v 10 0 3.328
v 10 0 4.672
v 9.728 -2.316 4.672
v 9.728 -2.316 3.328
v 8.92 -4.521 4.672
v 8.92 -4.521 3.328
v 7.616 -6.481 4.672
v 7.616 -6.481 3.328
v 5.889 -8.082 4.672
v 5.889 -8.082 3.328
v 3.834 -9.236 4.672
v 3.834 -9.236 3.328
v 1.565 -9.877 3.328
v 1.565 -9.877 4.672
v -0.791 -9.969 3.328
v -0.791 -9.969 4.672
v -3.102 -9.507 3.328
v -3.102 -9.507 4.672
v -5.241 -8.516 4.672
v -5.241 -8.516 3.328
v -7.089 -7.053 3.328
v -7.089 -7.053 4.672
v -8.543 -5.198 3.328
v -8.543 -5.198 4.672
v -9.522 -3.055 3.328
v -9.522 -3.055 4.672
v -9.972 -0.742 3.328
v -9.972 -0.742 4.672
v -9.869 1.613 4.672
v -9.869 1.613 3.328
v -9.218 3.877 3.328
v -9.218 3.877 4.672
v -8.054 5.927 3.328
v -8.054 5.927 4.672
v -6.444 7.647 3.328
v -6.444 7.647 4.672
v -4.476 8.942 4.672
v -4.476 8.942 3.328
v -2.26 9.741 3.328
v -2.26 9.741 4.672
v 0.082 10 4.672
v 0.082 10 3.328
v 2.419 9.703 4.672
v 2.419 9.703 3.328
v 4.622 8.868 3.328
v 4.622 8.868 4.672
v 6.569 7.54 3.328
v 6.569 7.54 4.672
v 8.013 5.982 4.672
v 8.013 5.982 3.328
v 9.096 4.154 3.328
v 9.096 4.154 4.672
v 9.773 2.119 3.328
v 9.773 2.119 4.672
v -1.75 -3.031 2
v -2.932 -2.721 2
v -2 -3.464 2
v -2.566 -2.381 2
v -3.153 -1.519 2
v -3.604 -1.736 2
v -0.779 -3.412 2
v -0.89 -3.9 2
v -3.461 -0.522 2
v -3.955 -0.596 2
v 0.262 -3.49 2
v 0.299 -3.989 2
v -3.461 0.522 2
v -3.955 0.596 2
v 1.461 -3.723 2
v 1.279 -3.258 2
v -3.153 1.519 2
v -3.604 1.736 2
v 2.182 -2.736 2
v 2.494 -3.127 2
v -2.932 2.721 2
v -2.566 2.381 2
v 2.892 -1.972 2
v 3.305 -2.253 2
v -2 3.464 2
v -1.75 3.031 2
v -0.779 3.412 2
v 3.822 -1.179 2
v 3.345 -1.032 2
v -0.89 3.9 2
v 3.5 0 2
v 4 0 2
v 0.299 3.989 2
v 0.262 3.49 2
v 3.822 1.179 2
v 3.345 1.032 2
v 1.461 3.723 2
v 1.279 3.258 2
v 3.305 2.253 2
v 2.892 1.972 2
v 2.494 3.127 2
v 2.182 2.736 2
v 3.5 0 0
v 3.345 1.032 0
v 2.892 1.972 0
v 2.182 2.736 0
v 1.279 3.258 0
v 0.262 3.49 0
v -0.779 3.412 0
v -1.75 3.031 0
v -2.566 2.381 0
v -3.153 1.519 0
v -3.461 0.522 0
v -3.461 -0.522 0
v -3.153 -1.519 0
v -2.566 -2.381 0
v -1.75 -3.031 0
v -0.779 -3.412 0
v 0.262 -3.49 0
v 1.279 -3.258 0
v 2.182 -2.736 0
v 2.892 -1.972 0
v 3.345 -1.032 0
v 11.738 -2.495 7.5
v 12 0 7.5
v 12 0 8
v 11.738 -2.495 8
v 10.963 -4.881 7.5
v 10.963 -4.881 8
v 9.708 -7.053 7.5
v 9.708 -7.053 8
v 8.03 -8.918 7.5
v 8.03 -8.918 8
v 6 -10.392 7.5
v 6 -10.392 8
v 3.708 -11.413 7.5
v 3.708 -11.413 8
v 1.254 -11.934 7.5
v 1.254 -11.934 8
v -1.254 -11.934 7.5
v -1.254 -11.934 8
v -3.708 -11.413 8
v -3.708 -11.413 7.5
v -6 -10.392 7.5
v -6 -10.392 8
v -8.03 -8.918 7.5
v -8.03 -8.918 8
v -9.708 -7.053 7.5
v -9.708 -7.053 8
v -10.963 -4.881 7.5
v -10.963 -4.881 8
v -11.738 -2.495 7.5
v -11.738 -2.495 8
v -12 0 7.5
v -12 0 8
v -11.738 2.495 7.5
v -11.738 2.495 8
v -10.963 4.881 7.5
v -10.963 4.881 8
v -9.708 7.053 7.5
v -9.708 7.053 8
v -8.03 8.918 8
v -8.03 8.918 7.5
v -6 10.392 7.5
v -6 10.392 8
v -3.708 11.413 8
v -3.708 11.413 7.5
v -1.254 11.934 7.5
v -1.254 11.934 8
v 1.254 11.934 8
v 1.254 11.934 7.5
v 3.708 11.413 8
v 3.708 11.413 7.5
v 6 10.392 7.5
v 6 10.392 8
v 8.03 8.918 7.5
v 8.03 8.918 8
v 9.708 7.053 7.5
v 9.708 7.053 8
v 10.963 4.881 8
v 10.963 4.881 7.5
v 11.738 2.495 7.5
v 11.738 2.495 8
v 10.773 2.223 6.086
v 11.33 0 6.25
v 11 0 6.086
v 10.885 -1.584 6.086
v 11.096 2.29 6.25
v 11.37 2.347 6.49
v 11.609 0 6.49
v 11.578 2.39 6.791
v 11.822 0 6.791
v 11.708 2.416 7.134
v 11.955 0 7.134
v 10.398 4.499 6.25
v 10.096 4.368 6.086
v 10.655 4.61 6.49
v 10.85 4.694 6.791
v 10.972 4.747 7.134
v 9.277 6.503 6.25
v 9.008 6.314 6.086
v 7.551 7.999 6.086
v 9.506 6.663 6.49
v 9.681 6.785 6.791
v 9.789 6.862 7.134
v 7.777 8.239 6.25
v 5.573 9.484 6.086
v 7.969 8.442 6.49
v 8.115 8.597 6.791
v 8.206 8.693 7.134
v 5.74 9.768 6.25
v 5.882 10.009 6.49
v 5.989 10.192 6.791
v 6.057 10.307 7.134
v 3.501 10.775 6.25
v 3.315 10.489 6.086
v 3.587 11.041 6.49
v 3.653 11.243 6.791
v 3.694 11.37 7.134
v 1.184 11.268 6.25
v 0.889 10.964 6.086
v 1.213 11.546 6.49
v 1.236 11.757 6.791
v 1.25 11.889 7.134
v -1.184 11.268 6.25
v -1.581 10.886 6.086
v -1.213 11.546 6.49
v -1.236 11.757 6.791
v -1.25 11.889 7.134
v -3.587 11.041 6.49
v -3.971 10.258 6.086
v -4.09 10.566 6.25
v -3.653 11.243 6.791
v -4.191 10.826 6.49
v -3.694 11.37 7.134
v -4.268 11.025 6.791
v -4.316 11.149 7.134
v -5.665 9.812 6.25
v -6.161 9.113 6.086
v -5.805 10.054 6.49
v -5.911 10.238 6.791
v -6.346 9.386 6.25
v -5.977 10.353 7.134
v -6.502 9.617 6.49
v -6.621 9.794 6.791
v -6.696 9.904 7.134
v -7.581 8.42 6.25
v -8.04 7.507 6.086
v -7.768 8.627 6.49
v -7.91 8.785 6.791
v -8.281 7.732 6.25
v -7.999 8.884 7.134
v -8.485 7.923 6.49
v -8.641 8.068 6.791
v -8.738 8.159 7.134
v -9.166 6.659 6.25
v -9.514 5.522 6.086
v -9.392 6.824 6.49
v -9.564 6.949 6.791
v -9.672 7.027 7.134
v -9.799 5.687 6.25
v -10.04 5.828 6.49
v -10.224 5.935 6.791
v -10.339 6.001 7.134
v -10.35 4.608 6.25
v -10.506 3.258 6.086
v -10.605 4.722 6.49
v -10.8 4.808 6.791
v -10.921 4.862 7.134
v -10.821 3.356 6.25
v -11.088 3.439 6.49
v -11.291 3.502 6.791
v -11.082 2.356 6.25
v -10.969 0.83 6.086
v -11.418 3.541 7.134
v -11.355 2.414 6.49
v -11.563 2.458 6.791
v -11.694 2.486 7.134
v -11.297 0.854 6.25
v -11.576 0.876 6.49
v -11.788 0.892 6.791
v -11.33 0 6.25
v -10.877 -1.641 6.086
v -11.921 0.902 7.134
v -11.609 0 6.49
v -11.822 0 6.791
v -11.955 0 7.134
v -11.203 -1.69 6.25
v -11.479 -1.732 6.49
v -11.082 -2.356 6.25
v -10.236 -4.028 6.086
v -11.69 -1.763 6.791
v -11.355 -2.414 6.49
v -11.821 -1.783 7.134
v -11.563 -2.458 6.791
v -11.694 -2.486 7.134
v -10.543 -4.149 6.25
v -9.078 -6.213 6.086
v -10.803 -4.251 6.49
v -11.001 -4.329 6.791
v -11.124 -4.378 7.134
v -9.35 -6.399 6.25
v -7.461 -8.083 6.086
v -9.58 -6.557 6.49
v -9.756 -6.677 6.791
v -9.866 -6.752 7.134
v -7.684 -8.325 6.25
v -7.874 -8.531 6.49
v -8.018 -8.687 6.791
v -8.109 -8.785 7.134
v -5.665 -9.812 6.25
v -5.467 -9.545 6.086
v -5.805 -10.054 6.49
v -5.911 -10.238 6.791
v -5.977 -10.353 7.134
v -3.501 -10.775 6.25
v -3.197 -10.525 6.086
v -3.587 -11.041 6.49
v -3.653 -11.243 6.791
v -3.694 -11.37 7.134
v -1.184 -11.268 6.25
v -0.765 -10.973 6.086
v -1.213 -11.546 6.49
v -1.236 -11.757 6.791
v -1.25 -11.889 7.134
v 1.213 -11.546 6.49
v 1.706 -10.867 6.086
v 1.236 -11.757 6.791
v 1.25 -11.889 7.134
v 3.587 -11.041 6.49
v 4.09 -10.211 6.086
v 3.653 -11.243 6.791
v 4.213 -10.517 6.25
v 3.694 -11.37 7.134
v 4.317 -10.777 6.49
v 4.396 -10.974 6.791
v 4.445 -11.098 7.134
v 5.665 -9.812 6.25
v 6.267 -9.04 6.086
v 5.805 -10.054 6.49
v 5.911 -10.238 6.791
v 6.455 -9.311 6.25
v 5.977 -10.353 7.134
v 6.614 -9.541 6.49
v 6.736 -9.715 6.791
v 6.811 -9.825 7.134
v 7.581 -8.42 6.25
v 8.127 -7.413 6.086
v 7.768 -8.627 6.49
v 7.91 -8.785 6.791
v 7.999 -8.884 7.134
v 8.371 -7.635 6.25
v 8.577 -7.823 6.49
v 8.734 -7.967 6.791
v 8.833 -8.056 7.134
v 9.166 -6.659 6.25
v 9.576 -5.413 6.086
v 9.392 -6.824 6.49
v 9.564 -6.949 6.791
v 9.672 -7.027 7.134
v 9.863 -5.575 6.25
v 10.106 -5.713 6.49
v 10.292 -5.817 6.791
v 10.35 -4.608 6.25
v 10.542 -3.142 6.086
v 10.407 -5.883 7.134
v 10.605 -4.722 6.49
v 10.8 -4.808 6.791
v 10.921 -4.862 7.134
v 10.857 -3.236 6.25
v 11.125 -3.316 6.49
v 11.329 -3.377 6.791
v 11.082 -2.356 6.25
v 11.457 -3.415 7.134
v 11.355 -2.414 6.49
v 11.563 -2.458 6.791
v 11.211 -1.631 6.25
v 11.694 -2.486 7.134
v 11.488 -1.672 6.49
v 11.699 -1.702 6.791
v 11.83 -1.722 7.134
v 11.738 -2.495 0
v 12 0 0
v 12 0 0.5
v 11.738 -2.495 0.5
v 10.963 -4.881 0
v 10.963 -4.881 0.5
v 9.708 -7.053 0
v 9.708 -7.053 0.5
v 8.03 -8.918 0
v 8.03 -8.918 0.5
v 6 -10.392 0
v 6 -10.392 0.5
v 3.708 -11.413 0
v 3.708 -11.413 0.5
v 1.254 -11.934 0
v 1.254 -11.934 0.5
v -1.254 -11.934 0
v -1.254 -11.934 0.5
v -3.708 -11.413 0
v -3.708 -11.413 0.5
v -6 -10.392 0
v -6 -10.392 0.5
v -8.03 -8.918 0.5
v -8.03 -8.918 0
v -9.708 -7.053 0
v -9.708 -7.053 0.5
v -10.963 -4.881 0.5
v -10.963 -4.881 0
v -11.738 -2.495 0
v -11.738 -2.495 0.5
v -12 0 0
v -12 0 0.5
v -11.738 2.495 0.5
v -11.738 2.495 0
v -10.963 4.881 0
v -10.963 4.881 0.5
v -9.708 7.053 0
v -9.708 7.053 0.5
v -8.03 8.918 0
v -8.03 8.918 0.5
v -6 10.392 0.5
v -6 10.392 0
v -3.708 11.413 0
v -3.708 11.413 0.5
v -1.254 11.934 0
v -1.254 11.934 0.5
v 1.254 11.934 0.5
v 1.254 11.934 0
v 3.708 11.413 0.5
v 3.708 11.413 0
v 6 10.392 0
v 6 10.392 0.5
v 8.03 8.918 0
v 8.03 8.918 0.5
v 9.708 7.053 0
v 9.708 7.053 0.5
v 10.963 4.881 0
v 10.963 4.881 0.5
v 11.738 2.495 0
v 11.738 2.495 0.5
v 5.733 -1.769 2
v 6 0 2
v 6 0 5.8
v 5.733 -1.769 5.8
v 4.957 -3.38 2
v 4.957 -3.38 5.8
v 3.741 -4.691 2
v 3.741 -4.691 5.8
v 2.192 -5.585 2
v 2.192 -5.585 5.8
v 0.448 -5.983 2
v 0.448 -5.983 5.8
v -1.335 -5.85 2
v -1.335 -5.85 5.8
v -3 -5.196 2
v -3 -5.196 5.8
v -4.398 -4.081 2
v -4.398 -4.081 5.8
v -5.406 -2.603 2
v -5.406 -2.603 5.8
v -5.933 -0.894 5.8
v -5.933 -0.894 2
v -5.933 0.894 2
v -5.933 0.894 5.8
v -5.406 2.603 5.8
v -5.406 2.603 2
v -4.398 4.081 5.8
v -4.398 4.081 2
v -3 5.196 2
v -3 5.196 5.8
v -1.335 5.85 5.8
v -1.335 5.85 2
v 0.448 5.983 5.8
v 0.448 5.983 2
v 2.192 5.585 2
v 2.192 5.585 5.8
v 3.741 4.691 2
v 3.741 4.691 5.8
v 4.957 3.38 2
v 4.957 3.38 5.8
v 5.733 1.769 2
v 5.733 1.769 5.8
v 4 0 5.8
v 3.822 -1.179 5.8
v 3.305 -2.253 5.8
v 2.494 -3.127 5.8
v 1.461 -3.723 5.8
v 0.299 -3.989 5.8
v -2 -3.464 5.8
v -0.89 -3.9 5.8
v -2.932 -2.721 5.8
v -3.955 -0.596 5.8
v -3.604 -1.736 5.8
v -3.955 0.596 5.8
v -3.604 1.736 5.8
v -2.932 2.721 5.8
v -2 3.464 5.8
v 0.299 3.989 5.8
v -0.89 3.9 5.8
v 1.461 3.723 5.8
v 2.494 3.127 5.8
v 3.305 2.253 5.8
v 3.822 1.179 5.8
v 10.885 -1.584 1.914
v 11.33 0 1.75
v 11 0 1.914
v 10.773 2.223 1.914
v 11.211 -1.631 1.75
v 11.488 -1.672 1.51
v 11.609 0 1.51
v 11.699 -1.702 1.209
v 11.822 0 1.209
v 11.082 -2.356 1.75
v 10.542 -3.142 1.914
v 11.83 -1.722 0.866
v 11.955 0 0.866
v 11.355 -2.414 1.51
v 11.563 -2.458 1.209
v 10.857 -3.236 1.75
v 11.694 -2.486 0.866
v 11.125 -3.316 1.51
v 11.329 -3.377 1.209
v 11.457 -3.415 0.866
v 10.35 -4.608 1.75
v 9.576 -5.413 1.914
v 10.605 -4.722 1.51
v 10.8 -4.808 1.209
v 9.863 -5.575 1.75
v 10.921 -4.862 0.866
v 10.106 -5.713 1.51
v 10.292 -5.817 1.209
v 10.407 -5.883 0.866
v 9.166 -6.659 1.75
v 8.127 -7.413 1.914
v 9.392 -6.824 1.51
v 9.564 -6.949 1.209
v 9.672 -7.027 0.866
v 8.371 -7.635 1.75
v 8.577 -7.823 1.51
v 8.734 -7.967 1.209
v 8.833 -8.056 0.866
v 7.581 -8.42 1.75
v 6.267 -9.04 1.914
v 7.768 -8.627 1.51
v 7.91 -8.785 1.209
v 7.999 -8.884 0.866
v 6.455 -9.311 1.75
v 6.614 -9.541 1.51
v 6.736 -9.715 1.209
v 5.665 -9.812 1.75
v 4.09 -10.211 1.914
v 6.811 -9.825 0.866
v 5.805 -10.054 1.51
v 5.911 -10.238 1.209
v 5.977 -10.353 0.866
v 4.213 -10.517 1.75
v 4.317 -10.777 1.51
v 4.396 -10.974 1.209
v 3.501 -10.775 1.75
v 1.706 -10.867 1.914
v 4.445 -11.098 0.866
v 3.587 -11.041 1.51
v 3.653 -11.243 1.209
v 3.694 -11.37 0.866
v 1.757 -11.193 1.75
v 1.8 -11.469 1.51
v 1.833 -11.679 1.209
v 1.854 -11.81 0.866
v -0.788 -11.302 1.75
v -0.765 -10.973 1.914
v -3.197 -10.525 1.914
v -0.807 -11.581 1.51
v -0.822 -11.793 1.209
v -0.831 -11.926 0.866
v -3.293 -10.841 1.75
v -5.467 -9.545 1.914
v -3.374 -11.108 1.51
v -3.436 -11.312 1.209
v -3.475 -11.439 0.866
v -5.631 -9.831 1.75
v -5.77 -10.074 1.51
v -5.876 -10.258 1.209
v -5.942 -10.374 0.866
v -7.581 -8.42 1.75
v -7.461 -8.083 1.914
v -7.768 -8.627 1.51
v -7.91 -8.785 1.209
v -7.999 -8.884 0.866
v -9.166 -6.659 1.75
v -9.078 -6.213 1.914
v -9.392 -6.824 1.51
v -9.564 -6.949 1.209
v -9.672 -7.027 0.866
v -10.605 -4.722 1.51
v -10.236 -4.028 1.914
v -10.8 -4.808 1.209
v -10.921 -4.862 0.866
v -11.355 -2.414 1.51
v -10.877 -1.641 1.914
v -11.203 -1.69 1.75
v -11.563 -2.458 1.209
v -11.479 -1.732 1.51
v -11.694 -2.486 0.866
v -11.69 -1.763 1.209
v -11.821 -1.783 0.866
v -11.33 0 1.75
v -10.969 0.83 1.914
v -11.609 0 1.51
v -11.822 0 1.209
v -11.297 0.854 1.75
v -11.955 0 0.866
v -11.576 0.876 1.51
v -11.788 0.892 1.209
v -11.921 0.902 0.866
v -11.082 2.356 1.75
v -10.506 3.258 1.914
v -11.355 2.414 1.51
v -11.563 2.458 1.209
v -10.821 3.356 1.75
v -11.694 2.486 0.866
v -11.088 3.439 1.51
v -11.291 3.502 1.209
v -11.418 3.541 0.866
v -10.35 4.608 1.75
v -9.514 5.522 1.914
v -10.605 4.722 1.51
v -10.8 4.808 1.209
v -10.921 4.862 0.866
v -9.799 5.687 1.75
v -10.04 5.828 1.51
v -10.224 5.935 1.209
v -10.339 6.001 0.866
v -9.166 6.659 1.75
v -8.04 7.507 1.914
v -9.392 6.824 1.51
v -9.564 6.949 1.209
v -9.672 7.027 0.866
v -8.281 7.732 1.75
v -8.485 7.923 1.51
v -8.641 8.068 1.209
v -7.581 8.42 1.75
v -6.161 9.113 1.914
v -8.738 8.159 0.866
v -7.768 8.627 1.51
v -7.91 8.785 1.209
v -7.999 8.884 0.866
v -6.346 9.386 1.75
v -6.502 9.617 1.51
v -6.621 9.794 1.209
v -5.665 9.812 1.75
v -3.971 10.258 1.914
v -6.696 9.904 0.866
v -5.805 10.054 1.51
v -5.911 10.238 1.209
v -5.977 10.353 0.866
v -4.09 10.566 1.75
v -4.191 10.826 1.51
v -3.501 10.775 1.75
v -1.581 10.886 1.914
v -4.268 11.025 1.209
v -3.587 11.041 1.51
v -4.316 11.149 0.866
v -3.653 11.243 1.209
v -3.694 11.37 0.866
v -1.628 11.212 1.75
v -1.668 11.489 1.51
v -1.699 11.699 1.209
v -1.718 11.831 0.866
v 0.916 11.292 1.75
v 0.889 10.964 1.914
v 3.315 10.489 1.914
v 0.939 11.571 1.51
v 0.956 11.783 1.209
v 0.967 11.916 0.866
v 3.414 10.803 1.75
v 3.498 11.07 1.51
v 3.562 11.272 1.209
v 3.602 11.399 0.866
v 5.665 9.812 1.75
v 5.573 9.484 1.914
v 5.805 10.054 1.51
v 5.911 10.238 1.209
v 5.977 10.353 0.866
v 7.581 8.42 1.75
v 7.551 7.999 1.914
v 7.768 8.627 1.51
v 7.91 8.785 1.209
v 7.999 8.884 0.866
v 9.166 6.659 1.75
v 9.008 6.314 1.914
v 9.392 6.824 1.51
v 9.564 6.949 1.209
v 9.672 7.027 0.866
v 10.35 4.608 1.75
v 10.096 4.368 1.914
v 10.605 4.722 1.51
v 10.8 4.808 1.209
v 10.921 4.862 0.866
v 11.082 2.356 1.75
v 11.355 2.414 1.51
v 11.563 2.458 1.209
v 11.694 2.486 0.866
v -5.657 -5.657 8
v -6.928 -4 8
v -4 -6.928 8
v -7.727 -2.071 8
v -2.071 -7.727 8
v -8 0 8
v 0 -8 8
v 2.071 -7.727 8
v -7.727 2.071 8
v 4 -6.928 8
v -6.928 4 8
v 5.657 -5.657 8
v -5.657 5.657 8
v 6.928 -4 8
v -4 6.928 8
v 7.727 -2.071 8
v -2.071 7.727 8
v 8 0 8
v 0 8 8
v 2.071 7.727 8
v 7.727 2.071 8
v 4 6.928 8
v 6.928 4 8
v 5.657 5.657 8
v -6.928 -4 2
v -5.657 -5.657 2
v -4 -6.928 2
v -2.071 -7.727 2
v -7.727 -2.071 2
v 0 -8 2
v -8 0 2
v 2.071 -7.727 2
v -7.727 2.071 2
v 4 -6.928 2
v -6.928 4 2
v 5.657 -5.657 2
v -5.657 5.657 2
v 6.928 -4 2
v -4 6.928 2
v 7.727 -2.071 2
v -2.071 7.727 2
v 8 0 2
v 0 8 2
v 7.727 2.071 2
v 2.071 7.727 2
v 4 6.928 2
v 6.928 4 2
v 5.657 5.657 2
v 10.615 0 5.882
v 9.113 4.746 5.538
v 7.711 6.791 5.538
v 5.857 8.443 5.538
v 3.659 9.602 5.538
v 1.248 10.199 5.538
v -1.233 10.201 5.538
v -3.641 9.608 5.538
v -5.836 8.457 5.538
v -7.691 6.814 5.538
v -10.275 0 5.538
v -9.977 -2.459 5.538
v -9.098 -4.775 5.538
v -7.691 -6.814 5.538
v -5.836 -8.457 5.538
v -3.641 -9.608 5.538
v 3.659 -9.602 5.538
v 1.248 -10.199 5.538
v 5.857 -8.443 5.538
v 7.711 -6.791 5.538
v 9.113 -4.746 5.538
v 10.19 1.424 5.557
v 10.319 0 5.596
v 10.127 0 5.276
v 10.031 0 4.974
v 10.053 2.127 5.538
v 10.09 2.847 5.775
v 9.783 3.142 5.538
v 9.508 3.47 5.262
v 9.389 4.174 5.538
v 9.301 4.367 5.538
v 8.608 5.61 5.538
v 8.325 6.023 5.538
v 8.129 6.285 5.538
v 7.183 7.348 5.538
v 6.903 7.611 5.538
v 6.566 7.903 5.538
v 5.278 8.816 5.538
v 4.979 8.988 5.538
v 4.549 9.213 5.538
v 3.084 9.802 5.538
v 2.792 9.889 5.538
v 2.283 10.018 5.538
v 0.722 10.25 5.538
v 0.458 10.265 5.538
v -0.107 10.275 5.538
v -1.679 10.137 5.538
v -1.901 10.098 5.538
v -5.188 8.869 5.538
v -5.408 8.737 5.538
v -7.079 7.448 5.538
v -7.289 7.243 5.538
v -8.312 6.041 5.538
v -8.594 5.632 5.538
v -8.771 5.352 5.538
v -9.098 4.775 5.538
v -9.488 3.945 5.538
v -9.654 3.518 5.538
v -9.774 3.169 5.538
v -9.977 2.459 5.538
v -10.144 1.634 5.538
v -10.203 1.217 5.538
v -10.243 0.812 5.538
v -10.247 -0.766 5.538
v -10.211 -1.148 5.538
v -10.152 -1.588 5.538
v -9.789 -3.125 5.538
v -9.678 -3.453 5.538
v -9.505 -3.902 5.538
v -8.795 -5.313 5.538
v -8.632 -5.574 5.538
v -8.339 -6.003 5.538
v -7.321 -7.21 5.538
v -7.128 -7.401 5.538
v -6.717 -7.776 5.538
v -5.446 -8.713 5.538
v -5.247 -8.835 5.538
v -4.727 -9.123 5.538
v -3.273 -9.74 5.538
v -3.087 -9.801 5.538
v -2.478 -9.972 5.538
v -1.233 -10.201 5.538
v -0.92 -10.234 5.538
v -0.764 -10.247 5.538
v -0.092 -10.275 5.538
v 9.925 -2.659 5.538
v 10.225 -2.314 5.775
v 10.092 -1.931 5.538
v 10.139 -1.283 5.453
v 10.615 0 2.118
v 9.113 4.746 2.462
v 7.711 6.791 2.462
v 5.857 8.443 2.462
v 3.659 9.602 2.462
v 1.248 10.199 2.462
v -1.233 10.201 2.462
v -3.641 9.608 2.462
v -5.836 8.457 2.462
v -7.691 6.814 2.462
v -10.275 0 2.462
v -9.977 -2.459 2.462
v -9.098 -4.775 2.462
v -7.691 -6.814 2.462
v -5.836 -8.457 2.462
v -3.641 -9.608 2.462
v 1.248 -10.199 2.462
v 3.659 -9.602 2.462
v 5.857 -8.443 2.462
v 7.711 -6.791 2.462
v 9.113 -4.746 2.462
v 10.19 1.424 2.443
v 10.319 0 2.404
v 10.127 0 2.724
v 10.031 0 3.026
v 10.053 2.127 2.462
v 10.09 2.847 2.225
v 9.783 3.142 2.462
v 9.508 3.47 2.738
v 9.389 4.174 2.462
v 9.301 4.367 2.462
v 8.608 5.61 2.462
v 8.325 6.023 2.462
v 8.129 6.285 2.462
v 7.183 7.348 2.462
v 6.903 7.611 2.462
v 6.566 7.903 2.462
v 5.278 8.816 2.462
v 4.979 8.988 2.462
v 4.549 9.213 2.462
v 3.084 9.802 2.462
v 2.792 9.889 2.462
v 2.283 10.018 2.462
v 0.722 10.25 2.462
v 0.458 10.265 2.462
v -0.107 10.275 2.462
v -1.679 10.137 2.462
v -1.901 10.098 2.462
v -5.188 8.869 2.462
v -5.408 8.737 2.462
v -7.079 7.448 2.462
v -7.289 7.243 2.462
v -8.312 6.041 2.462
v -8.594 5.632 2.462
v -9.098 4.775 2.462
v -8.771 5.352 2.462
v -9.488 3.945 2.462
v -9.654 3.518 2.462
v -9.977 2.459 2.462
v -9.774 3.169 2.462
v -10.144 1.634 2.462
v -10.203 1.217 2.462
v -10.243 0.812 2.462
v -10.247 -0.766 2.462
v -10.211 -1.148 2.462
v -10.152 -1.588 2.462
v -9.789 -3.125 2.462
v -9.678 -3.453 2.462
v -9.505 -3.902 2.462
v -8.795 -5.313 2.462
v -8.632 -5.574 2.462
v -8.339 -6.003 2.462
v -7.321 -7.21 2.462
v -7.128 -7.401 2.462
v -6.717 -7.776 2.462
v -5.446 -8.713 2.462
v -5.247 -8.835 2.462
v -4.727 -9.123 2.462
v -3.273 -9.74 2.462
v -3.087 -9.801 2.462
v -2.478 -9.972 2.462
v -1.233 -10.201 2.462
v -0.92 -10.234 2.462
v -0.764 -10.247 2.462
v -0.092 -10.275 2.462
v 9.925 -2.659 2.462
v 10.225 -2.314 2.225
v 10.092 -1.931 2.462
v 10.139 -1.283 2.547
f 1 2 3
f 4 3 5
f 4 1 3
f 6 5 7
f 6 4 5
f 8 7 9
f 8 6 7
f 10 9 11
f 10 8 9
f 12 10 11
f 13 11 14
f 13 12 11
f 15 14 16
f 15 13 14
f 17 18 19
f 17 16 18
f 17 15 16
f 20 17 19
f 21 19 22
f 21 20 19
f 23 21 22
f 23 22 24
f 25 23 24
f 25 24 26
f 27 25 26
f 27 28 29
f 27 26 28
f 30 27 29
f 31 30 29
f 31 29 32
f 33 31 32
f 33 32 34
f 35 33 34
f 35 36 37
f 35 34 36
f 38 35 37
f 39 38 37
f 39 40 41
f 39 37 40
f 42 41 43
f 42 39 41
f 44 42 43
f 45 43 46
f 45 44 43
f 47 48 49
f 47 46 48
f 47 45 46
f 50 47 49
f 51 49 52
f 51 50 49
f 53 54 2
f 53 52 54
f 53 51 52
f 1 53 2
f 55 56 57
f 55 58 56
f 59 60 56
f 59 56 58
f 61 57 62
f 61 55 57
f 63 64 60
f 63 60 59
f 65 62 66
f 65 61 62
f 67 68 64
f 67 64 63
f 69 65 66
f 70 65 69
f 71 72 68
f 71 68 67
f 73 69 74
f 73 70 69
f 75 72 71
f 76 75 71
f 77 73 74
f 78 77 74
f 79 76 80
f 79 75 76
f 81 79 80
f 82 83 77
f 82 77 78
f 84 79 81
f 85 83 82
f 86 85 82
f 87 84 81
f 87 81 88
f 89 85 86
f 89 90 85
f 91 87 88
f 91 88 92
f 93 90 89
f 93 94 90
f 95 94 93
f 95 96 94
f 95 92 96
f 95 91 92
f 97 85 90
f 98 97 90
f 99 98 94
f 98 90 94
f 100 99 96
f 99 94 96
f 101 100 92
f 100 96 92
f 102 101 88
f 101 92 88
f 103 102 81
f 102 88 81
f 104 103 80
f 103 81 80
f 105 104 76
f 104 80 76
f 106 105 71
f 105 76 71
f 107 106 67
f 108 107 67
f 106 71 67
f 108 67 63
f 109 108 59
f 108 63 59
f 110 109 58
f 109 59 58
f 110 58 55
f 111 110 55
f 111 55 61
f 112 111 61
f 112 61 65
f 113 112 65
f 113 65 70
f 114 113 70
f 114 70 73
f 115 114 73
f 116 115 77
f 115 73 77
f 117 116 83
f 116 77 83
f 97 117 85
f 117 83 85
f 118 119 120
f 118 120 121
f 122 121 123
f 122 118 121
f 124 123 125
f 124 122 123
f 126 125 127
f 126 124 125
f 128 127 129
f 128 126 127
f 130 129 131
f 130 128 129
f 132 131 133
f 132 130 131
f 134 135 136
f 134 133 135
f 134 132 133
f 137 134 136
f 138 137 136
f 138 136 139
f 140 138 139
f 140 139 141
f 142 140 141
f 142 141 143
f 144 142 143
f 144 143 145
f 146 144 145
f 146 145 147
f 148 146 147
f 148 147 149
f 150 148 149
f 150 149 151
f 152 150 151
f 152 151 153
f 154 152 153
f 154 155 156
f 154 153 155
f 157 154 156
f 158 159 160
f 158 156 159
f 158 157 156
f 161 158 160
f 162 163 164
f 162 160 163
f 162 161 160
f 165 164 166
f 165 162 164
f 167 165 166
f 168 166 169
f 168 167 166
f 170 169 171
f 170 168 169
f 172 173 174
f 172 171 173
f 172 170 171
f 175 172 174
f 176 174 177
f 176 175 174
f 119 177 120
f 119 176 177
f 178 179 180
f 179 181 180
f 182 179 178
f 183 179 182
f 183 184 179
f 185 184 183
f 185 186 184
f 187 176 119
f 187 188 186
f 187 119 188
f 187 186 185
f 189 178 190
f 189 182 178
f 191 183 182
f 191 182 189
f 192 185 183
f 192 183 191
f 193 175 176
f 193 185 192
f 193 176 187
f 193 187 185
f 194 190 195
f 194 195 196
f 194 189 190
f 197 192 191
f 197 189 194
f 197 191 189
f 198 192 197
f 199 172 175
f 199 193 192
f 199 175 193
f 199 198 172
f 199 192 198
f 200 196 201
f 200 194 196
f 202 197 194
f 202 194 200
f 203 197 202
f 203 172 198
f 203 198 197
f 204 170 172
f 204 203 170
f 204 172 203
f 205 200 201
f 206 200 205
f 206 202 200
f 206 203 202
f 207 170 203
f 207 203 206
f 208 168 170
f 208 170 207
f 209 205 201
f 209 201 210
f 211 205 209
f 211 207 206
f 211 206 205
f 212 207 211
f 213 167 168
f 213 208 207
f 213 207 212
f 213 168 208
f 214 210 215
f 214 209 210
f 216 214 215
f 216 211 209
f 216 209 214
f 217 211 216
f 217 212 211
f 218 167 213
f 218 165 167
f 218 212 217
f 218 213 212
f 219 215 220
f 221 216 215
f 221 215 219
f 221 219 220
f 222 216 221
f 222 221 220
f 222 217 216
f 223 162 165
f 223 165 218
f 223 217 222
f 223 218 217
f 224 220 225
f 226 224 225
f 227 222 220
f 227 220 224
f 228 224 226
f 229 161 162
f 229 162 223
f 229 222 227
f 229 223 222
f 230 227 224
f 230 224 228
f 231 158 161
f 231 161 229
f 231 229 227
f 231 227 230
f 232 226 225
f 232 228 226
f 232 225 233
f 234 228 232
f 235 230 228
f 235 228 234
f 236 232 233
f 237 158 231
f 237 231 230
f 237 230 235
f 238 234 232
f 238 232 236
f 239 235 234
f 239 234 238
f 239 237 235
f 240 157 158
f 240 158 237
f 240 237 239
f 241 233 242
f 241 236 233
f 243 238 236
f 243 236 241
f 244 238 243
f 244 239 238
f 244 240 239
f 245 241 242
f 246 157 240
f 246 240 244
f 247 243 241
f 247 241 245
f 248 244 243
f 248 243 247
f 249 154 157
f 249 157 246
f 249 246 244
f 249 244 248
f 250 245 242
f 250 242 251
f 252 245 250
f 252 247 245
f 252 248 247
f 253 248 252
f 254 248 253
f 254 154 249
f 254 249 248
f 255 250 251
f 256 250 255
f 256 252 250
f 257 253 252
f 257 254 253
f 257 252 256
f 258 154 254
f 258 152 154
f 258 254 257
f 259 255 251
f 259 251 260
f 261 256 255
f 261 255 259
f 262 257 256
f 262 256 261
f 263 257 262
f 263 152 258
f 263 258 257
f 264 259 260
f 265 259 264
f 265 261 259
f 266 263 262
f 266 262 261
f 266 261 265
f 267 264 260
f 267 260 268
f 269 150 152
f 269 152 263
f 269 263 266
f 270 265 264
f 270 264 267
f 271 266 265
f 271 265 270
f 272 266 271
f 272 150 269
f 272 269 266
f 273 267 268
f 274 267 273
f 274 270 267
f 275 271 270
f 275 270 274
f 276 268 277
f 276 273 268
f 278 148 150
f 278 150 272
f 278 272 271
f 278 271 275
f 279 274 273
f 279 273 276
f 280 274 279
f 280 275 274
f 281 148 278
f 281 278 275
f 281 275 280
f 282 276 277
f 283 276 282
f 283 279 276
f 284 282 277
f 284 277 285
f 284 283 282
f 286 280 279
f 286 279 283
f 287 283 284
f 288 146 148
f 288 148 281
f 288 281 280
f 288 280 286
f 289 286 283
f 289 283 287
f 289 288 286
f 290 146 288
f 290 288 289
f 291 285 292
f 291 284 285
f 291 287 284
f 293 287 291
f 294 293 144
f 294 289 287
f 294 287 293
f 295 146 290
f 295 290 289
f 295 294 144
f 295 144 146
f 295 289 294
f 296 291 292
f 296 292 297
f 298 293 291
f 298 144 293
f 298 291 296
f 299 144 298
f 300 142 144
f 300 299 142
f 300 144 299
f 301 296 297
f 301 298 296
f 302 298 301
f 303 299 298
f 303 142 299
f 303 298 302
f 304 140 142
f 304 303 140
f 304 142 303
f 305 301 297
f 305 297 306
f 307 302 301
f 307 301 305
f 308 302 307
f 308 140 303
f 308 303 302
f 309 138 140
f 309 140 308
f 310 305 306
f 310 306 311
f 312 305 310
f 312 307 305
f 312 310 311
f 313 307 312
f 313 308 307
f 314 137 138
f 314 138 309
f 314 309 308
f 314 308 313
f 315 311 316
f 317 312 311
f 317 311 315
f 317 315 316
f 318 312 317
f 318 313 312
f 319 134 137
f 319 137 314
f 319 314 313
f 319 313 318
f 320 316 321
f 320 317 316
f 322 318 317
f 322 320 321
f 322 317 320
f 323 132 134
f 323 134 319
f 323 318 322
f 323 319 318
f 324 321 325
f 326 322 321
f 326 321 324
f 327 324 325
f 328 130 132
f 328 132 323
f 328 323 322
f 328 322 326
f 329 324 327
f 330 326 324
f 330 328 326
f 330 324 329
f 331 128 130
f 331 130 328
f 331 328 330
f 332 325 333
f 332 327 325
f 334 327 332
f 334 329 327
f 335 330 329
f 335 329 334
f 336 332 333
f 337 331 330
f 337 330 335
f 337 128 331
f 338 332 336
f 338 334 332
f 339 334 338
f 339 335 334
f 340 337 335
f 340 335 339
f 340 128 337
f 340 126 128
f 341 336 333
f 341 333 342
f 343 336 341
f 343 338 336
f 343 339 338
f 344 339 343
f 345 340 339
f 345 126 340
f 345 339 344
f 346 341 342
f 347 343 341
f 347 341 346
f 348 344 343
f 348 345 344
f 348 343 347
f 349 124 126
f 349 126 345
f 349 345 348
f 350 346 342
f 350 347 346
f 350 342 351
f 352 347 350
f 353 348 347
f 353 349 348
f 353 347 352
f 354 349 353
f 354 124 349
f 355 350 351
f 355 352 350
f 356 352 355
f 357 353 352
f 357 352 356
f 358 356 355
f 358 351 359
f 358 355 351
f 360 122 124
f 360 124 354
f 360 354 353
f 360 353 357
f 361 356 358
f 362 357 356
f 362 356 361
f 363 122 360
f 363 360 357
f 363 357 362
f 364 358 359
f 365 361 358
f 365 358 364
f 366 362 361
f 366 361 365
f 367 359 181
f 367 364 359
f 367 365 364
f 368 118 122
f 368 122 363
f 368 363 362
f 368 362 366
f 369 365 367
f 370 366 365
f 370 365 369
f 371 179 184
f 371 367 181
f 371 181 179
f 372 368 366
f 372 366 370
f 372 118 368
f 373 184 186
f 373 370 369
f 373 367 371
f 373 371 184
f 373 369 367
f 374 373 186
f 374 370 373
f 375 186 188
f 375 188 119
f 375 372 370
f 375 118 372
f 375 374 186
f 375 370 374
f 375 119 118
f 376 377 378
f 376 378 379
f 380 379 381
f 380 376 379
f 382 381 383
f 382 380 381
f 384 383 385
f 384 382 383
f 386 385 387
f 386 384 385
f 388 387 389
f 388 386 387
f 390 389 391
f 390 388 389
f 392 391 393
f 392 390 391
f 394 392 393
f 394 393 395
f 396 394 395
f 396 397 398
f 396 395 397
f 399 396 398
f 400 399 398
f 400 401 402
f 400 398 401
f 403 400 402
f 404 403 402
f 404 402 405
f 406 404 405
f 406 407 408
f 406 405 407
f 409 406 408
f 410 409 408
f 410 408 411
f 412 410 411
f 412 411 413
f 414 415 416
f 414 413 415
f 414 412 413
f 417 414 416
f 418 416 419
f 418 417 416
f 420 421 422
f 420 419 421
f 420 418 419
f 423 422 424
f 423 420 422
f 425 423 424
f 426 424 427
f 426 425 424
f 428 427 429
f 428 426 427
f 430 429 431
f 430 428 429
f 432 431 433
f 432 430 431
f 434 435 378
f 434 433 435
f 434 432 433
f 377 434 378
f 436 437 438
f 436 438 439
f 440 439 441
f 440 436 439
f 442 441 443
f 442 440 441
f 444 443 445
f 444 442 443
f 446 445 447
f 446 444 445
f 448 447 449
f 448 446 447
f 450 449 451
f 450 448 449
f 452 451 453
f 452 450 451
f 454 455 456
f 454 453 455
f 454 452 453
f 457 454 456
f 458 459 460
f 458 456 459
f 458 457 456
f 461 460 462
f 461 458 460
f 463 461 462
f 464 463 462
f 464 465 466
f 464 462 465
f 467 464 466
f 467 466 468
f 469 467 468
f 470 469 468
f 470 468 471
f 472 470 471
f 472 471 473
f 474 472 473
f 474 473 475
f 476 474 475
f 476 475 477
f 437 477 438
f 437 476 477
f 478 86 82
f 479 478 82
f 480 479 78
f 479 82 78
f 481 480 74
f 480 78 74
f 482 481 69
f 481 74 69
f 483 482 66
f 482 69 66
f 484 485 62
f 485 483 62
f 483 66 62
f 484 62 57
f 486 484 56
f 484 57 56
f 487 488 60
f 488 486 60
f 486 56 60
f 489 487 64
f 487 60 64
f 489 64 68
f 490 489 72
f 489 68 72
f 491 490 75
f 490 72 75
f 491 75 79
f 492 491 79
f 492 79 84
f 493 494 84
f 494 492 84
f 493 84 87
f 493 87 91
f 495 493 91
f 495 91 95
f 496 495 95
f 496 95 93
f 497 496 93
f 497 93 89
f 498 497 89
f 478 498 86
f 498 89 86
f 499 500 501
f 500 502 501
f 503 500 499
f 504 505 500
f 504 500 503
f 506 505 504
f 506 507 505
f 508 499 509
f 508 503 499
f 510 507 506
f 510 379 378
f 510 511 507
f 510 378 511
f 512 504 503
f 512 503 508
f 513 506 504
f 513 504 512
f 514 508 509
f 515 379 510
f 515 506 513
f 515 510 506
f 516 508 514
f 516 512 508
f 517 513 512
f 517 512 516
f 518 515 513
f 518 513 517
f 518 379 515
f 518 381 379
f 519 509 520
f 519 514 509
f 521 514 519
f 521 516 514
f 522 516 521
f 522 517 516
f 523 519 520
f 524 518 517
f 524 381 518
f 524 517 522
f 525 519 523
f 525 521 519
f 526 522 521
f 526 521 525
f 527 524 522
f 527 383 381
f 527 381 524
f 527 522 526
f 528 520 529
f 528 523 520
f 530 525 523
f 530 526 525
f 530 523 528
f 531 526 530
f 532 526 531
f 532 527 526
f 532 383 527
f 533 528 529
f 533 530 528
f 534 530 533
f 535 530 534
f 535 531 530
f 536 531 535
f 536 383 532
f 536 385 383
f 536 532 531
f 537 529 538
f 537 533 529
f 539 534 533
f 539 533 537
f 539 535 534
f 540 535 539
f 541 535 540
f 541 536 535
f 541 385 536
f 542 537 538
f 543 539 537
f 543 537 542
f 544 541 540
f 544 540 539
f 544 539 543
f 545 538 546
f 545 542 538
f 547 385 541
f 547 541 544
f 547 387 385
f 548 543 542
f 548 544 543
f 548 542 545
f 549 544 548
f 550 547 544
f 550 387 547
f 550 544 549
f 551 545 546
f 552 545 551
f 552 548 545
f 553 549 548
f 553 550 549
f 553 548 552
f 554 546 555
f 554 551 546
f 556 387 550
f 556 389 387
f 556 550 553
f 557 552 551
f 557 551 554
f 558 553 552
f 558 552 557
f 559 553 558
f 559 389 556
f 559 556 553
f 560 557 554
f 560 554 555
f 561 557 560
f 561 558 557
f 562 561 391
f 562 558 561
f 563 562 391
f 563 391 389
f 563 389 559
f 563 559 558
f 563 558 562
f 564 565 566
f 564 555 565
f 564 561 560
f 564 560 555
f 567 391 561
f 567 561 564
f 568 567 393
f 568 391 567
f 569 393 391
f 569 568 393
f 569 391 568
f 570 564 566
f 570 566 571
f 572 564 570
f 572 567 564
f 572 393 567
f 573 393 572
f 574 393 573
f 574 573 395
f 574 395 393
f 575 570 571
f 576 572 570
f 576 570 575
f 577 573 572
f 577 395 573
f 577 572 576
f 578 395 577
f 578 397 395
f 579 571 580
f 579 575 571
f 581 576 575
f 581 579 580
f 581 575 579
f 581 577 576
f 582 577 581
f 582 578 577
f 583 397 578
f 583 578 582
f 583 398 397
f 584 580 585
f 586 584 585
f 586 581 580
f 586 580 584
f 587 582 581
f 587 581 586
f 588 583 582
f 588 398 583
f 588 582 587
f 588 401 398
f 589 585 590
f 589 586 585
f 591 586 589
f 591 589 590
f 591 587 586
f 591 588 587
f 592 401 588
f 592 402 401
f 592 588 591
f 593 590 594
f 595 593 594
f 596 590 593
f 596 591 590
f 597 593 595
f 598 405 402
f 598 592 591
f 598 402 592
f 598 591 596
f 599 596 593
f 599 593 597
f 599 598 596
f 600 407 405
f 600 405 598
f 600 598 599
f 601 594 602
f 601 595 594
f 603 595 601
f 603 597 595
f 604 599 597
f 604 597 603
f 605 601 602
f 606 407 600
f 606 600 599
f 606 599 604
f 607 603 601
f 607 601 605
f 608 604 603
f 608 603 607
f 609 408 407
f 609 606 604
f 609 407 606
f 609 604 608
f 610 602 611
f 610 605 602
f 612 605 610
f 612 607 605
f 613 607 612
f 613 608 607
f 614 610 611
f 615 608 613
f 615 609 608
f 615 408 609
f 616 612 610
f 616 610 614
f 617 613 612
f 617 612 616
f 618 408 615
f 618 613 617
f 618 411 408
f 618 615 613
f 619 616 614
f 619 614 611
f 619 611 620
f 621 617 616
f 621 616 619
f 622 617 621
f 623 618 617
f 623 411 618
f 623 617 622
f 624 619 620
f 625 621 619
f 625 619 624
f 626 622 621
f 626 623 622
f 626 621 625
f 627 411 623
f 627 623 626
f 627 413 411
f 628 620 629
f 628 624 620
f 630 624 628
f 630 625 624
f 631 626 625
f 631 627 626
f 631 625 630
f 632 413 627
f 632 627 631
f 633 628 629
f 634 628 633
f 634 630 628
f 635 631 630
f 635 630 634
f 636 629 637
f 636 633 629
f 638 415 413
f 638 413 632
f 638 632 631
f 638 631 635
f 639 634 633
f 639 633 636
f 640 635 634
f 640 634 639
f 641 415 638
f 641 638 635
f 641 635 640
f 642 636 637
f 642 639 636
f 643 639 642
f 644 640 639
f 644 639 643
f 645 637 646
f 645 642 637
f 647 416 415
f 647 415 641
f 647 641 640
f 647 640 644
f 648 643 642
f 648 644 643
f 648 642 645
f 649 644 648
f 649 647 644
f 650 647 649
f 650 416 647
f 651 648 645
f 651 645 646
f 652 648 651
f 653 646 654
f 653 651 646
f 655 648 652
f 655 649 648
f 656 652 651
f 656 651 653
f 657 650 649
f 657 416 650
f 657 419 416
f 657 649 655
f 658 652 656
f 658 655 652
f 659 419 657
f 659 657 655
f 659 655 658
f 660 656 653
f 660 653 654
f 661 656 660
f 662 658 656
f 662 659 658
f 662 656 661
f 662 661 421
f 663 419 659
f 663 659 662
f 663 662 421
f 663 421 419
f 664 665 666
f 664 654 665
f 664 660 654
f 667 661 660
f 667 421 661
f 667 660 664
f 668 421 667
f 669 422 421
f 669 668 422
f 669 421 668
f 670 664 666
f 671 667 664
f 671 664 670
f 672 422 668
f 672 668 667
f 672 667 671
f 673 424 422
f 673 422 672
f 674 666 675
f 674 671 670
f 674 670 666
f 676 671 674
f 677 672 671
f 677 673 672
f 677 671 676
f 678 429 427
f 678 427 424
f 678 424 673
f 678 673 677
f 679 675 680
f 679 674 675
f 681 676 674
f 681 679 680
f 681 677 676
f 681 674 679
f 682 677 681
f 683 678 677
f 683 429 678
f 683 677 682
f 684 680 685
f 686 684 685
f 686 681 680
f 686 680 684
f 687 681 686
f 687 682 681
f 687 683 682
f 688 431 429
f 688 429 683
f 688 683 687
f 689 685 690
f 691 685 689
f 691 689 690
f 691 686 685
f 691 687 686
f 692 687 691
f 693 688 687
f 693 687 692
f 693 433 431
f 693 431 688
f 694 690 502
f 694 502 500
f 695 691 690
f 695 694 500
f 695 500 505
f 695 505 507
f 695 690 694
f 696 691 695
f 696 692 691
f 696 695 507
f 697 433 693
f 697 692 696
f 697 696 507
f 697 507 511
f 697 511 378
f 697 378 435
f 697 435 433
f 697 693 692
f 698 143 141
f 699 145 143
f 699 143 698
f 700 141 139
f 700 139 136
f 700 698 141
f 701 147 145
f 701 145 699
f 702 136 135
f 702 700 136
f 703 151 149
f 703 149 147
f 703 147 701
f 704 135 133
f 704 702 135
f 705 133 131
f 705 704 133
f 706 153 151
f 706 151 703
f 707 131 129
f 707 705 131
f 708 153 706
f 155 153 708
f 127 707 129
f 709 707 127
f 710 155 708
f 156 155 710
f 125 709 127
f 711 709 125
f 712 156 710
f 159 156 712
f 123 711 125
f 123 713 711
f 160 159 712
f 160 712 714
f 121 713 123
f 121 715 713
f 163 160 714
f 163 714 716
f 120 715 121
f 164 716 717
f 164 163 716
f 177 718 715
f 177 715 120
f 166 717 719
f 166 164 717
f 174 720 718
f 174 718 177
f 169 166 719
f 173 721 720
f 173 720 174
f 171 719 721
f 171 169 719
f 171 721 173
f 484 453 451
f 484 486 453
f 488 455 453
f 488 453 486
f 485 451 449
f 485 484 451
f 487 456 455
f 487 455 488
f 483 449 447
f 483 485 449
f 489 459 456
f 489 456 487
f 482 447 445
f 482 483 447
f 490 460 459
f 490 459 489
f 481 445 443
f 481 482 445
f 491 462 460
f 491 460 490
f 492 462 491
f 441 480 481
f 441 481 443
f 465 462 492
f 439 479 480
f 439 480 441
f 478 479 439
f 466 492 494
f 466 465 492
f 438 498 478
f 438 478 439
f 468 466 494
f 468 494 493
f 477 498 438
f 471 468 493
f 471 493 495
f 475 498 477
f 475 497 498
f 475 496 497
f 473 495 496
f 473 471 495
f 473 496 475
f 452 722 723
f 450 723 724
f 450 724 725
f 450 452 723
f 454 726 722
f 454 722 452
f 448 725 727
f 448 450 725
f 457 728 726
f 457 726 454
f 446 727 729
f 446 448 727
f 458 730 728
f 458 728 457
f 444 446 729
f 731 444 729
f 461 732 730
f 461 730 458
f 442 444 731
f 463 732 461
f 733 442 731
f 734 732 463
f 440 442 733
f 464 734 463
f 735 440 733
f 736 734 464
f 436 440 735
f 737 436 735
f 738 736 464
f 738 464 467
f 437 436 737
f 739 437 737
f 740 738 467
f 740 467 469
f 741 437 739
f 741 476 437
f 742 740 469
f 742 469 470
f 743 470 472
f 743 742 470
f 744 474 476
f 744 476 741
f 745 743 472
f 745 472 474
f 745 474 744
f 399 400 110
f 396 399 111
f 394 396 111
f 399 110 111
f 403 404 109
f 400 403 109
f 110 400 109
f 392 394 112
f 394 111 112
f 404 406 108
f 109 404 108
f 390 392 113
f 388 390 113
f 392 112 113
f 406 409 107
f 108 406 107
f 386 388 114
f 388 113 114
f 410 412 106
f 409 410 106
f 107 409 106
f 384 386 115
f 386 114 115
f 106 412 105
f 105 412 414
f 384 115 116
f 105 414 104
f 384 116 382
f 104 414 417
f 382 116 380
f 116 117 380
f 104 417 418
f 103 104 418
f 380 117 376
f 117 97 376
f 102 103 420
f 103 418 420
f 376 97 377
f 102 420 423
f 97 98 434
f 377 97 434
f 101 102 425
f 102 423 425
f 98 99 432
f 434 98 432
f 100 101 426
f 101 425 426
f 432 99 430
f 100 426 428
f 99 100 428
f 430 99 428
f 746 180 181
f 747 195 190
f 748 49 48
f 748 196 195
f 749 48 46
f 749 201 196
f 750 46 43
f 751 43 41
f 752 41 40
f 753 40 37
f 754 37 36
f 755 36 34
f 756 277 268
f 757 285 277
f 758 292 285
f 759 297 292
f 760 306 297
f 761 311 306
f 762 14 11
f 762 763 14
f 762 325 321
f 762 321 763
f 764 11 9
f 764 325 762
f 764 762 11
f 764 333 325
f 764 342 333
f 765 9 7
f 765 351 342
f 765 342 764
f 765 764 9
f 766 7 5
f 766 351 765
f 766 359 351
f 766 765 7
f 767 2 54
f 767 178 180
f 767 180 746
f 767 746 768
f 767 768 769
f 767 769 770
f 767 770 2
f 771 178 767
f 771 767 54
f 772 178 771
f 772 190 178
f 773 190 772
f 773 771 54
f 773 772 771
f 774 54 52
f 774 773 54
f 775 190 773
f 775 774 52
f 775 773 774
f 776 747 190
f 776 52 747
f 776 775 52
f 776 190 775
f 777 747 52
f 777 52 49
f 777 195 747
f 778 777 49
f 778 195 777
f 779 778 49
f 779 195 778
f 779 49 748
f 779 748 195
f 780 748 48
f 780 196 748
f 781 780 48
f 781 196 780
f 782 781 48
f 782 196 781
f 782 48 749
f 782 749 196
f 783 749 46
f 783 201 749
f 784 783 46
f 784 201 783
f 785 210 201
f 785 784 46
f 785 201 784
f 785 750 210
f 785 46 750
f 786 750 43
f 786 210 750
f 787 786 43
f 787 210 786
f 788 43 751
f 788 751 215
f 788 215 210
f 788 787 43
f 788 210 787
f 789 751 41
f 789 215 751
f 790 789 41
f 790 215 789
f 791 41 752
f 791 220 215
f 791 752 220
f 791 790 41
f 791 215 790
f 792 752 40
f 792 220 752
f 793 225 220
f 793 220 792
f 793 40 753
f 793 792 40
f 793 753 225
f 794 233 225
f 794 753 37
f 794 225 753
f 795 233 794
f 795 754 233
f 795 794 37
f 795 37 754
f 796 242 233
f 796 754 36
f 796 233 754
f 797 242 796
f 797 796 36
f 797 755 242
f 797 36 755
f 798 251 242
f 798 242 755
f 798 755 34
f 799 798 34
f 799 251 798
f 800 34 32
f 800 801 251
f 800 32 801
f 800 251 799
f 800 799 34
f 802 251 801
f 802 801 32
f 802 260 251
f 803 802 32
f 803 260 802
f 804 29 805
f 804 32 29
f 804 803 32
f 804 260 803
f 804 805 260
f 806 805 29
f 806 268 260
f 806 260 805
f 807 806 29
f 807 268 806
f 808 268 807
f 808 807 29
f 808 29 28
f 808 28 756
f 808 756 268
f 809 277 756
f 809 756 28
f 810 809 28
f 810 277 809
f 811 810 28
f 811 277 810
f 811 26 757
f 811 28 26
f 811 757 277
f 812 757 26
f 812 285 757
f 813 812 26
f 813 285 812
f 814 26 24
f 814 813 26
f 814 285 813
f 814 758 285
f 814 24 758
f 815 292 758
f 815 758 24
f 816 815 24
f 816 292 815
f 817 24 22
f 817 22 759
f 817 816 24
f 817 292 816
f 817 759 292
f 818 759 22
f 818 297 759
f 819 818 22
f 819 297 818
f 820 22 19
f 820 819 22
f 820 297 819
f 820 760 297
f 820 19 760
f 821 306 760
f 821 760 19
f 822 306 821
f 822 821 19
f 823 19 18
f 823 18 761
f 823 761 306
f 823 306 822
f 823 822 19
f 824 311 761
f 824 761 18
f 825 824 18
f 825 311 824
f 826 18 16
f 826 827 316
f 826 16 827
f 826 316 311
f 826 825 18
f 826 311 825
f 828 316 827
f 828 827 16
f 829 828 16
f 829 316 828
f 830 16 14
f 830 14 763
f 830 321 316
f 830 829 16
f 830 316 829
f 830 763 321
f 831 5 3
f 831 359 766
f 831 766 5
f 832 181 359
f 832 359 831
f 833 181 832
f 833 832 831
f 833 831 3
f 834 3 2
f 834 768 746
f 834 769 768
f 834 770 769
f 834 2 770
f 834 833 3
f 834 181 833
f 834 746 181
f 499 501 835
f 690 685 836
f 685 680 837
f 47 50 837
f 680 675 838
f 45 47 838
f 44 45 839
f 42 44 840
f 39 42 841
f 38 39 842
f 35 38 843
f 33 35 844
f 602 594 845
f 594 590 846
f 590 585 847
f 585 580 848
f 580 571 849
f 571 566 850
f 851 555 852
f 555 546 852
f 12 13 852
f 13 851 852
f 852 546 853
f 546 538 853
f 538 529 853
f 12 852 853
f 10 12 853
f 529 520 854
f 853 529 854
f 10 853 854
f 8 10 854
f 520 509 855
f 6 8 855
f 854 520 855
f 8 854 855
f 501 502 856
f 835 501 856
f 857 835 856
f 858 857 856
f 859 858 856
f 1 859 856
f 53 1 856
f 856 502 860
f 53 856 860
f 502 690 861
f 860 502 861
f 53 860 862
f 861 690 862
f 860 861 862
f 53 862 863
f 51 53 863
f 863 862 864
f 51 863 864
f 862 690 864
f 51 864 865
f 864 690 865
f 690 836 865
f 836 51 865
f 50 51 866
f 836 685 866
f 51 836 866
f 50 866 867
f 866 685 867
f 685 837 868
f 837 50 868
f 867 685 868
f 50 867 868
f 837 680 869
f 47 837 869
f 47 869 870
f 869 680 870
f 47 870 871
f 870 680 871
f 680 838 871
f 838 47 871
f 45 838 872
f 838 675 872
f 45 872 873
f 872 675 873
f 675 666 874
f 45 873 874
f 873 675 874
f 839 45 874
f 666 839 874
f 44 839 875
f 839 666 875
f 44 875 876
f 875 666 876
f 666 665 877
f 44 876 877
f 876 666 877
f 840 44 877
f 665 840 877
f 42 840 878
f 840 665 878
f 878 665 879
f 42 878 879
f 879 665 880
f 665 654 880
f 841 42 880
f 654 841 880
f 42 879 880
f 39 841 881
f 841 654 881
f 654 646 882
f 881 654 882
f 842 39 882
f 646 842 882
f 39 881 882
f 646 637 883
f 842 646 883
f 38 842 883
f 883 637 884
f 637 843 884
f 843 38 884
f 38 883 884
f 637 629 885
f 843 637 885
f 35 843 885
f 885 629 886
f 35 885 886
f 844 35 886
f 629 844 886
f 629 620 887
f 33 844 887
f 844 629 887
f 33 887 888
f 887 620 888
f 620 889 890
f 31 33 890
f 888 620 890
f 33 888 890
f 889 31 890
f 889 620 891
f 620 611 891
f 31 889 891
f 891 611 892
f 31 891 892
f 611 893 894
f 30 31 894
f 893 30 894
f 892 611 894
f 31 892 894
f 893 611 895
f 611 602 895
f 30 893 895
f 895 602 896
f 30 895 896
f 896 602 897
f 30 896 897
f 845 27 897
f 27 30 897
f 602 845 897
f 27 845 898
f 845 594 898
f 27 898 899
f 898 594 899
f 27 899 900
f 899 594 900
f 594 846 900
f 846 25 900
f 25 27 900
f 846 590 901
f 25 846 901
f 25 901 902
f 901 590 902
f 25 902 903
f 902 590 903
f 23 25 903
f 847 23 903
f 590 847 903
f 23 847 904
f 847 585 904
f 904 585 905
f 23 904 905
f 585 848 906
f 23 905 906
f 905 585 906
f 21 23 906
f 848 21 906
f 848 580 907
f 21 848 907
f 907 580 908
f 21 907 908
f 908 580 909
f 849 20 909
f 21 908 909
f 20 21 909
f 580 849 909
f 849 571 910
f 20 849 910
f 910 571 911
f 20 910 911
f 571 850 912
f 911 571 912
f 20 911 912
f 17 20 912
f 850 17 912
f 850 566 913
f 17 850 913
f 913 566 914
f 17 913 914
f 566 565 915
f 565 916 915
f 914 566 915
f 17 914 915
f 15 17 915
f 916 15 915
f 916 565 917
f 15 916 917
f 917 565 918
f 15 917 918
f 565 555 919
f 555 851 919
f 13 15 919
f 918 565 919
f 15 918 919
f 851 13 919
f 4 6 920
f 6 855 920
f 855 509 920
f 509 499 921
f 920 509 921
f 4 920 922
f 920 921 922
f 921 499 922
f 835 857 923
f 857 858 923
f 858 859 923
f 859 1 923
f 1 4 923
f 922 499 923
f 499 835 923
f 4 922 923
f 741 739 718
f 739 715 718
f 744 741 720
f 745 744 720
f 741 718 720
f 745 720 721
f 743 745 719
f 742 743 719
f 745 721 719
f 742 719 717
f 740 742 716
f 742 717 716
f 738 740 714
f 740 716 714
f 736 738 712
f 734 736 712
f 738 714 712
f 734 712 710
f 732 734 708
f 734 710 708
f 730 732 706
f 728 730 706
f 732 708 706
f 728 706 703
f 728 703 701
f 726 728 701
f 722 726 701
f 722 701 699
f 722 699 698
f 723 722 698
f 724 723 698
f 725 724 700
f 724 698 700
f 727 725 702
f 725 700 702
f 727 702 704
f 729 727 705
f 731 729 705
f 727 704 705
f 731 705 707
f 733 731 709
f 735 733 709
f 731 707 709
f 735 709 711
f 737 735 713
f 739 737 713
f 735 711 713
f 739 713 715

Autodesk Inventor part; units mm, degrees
ref_plane "YZ Plane" through (0, 0, 0) normal (1, 0, 0) x (0, 1, 0)
ref_plane "XZ Plane" through (0, 0, 0) normal (0, 1, 0) x (-1, 0, 0)
ref_plane "XY Plane" through (0, 0, 0) normal (0, 0, 1) x (1, 0, 0)
sketch "Sketch1" plane through (0, 0, 0) normal (0, 0, 1) x (1, 0, 0)
  circle A0 centre (0, 0) radius 12
  dimension "d0" = 24
extrude "Extrusion1" add sketch "Sketch1" along normal blind 2
sketch "Sketch2" plane through (0, 0, 2) normal (0, 0, 1) x (1, 0, 0)
  circle A0 centre (0, 0) radius 12 projected
  circle A1 centre (0, 0) radius 10
  dimension "d4" = 20
extrude "Extrusion2" add sketch "Sketch2" along normal blind 4 contours A1
sketch "Sketch3" plane through (0, 0, 6) normal (0, 0, 1) x (1, 0, 0)
  circle A0 centre (0, 0) radius 10 projected
  circle A1 centre (0, 0) radius 12
  dimension "d26" = 24
extrude "Extrusion3" add sketch "Sketch3" along normal blind 2 contours A0 | A1
fillet "Fillet1" radius 1.5 4 edges at (-12, 0, 6) (-10, 0, 6) (-12, 0, 2) (-10, 0, 2)
sketch "Sketch7" plane through (0, 0, 8) normal (0, 0, 1) x (1, 0, 0)
  circle A0 centre (0, 0) radius 12 projected
  circle A1 centre (0, 0) radius 8
  dimension "d29" = 16
extrude "Extrusion7" cut sketch "Sketch7" against normal blind 6 contours A1
sketch "Sketch8" plane through (0, 0, 2) normal (0, 0, 1) x (1, 0, 0)
  circle A0 centre (0, 0) radius 8 projected
  circle A1 centre (0, 0) radius 3.5
  dimension "d36" = 7
extrude "Extrusion8" cut sketch "Sketch8" against normal blind 8 contours A1
sketch "Sketch9" plane through (0, 0, 2) normal (0, 0, 1) x (1, 0, 0)
  circle A0 centre (0, 0) radius 8 projected
  circle A1 centre (0, 0) radius 4
  circle A2 centre (0, 0) radius 6
  dimension "d40" = 12
  dimension "d41" = 8
extrude "Extrusion9" add sketch "Sketch9" along normal blind 3.8 contours A2
properties part number "guidance wheel"
